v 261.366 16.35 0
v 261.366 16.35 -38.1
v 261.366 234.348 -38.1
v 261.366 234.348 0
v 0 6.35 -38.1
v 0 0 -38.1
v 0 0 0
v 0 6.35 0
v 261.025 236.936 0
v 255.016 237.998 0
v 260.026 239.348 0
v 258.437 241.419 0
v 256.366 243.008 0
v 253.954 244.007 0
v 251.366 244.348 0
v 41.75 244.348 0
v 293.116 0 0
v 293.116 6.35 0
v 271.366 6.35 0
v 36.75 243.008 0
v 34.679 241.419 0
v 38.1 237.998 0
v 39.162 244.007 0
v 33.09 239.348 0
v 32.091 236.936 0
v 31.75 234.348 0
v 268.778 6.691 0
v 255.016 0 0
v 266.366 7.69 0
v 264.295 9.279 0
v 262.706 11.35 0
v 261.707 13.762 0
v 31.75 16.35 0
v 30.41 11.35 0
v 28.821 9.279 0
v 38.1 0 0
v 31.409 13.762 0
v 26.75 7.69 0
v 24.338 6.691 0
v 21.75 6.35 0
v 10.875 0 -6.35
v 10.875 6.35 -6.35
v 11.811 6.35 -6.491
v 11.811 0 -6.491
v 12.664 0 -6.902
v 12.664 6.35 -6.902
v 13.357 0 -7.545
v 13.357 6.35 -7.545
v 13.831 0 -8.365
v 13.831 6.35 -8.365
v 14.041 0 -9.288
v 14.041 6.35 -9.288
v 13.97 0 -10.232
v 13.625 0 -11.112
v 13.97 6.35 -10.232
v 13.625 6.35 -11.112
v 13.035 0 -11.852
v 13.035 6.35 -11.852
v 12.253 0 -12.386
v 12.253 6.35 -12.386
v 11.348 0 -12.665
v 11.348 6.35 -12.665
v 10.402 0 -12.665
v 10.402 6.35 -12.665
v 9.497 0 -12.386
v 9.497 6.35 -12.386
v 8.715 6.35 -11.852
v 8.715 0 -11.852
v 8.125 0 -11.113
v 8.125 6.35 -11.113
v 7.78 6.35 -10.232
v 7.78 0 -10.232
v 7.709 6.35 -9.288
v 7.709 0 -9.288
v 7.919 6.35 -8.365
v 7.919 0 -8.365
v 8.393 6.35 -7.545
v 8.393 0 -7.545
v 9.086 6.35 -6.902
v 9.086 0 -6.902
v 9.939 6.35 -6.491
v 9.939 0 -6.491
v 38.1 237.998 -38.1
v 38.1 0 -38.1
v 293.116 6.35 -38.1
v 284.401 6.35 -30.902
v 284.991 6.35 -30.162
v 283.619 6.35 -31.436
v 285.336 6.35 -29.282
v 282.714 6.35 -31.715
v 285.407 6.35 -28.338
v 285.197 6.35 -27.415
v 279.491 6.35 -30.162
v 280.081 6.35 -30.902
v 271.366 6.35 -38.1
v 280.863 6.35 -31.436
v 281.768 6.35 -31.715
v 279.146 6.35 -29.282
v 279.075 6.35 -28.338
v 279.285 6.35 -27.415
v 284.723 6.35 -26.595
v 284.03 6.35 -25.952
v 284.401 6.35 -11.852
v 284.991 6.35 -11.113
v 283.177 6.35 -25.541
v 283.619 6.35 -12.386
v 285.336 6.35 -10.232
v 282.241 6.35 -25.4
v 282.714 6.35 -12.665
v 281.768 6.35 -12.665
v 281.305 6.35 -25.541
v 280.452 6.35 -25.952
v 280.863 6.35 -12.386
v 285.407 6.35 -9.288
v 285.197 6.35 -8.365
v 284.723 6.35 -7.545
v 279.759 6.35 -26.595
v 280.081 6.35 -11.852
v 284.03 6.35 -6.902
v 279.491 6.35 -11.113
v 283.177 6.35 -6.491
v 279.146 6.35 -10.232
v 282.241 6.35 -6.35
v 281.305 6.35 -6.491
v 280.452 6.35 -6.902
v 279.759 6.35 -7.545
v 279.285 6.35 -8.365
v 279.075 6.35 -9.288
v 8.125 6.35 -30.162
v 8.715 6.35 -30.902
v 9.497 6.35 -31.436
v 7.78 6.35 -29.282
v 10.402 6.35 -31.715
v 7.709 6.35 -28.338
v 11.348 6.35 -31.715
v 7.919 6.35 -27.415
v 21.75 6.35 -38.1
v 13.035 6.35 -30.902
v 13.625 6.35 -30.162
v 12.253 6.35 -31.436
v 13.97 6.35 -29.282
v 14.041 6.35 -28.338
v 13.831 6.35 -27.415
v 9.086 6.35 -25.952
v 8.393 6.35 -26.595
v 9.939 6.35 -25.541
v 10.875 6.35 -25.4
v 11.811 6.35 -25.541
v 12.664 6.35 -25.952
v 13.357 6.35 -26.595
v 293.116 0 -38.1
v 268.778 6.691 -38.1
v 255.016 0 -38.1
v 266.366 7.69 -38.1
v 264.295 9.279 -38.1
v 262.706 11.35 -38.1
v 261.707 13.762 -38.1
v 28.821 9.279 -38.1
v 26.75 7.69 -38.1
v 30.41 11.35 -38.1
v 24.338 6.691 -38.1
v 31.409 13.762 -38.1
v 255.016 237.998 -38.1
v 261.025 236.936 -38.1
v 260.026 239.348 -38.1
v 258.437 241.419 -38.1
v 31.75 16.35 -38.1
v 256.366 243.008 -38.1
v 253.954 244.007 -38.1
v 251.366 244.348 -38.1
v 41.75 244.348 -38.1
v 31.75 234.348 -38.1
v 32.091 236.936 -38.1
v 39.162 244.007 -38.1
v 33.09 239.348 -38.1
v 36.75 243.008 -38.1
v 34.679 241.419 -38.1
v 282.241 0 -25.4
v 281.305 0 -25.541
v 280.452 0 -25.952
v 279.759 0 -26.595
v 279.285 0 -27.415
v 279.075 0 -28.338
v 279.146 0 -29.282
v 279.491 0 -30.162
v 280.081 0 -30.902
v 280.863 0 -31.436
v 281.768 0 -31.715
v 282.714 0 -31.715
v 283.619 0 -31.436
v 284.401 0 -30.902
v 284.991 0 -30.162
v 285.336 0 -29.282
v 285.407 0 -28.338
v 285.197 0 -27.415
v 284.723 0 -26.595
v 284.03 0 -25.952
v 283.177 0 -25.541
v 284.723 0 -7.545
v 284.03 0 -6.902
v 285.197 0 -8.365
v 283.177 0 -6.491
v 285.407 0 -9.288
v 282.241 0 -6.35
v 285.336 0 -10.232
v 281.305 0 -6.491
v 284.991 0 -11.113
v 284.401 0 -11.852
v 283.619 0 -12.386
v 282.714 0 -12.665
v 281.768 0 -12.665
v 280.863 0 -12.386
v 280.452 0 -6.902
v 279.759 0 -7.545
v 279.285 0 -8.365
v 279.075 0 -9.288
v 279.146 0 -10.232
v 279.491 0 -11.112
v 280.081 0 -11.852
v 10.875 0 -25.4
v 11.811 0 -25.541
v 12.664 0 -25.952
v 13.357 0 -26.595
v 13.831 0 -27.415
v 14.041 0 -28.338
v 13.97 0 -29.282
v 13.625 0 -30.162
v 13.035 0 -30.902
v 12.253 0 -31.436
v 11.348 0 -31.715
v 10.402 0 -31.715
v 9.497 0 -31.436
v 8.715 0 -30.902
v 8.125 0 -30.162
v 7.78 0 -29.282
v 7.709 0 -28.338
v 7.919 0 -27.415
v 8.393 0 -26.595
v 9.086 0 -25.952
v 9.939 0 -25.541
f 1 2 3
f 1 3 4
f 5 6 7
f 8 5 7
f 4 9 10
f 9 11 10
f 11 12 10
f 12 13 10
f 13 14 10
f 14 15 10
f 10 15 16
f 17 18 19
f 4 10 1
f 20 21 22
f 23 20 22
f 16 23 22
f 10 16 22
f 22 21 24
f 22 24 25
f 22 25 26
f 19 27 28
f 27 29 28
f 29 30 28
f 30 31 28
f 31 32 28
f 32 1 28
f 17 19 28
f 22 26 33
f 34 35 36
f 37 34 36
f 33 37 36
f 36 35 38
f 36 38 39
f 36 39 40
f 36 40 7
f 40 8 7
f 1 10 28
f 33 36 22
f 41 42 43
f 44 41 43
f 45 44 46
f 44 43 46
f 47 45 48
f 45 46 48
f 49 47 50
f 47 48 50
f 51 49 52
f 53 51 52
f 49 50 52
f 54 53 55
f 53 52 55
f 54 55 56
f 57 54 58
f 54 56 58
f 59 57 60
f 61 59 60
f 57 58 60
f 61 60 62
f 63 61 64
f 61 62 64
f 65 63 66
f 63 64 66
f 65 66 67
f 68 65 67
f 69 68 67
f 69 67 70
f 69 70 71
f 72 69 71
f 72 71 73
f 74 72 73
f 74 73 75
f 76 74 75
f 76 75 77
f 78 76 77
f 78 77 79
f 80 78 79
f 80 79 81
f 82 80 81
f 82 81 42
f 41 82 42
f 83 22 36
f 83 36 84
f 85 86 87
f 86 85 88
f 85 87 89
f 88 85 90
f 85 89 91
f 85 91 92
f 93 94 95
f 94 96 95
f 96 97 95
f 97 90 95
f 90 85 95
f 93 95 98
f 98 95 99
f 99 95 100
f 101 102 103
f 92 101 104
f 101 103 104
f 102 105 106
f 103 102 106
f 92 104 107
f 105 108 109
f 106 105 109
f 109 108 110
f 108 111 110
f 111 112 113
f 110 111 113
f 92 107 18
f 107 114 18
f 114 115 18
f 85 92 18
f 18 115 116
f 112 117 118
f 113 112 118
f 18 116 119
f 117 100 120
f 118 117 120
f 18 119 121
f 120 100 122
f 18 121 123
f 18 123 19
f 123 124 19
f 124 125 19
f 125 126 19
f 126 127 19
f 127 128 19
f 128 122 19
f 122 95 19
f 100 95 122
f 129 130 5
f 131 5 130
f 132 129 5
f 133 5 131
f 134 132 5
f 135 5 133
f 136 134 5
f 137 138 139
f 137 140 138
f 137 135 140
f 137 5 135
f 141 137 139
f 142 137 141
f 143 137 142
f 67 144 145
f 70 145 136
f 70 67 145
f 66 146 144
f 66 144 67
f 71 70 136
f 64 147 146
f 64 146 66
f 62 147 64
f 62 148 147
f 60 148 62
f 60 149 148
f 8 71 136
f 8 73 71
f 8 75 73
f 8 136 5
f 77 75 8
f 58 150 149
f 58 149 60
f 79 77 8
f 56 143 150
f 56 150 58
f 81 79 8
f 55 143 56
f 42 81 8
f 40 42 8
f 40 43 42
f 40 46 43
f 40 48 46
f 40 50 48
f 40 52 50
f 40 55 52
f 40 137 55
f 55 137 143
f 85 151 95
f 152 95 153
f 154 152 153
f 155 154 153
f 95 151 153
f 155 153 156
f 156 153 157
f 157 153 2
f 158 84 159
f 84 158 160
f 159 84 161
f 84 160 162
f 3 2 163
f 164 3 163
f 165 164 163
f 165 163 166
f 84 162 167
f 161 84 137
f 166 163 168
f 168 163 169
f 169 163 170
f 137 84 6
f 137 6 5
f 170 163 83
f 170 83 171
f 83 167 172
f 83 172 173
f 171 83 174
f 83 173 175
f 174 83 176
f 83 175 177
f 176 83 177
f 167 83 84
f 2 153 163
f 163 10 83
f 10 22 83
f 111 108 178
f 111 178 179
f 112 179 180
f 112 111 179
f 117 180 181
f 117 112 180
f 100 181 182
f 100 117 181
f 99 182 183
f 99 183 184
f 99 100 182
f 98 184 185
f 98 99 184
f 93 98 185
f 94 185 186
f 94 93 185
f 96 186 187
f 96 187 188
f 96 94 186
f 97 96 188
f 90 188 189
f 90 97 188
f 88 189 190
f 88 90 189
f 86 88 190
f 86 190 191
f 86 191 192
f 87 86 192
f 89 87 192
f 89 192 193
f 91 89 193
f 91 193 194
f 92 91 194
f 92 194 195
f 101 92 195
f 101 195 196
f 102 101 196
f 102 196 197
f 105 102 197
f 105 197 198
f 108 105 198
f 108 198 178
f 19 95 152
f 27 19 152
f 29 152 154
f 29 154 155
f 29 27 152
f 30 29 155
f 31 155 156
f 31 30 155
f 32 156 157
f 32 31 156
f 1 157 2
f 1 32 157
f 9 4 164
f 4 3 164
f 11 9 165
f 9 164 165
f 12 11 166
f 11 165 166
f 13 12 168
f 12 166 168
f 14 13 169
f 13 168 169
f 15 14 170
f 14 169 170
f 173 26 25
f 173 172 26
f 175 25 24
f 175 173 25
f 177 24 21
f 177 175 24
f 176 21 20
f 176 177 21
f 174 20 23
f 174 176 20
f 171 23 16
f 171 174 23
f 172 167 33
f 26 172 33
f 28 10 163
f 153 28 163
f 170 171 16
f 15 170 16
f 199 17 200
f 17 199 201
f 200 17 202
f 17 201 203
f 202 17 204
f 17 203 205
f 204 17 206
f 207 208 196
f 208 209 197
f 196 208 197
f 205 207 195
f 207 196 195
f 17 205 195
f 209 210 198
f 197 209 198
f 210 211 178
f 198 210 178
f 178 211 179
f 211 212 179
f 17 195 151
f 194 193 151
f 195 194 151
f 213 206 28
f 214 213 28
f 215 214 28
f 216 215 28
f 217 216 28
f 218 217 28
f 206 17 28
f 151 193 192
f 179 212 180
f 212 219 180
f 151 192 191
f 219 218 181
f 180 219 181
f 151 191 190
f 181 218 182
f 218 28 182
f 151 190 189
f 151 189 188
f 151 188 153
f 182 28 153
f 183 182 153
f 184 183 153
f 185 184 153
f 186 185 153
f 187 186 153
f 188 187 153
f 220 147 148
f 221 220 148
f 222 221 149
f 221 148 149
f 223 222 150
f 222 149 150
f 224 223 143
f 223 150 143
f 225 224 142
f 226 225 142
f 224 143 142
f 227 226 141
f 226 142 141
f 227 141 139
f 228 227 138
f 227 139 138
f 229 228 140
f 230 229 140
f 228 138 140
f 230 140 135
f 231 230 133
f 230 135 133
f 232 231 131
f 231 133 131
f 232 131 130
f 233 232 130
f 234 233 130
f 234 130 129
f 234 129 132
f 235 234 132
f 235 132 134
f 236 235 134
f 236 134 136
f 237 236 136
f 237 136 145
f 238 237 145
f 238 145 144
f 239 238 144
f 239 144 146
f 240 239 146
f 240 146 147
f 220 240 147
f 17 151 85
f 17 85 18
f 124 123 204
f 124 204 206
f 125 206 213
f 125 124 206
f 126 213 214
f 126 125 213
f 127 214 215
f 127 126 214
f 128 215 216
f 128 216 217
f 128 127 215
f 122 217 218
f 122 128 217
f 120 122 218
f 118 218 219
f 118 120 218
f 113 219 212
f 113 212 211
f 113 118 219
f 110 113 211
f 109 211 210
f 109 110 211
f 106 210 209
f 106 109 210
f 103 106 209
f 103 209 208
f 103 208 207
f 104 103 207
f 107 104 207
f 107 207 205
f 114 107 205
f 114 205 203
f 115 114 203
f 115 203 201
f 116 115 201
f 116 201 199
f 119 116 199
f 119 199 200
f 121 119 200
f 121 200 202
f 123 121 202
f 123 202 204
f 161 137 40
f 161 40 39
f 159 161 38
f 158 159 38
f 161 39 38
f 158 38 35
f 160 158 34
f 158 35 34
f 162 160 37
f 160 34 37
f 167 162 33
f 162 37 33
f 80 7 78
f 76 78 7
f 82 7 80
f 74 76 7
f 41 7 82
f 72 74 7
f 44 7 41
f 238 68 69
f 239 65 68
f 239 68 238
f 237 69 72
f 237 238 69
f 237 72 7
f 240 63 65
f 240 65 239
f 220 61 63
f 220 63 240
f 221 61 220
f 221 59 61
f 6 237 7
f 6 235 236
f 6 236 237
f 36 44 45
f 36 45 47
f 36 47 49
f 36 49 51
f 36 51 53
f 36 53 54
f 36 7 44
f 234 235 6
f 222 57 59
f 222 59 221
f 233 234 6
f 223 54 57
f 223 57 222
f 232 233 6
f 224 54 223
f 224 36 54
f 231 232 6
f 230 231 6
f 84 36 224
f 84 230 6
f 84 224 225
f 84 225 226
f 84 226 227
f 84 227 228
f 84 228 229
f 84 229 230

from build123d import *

# Parameters (mm, degrees)
SKETCH2_W            = 38.1
SKETCH2_H            = 6.35
FILLET1_R            = 10
CUT_EXTRUDE1_REACH   = 284.088
SKETCH3_R            = 3.175
FILLET1_OF_MIRROR1_R = 10


with BuildPart() as part:
    # Sweep1: sweep along a path in Sketch1
    with BuildLine(Plane.XY) as sweep1_path:
        Line((0, 0), (38.1, 0))
        Line((38.1, 0), (38.1, 237.998))
        Line((38.1, 237.998), (146.558, 237.998))
    # Sketch2 → Sweep1 (sweep)
    with BuildSketch(Plane(origin=(0, 0, 0), x_dir=(0, 0, -1), z_dir=(1, 0, 0))):
        with Locations((19.05, 3.175)):
            Rectangle(SKETCH2_W, SKETCH2_H)
    sweep1 = sweep(path=sweep1_path.line, transition=Transition.RIGHT)

    # Fillet1
    fillet1_edges = [part.edges().sort_by_distance(p)[0] for p in [
        (31.75, 6.35, -19.05),
        (31.75, 244.348, -19.05),
    ]]
    fillet(fillet1_edges, radius=FILLET1_R)

    # Sketch3 → Cut-Extrude1 (cut, up to next)
    with BuildSketch(Plane(origin=(0, 6.35, 0), x_dir=(1, 0, 0), z_dir=(0, 1, 0)), mode=Mode.PRIVATE) as cut_extrude1_sk1:
        with Locations((10.875, 28.575)):
            Circle(SKETCH3_R)
    cut_extrude1_tool1 = extrude(cut_extrude1_sk1.sketch, amount=-CUT_EXTRUDE1_REACH, mode=Mode.PRIVATE) & part.part
    # Sketch3 → Cut-Extrude1 (cut, up to next)
    with BuildSketch(Plane(origin=(0, 6.35, 0), x_dir=(1, 0, 0), z_dir=(0, 1, 0)), mode=Mode.PRIVATE) as cut_extrude1_sk2:
        with Locations((10.875, 9.525)):
            Circle(SKETCH3_R)
    cut_extrude1_tool2 = extrude(cut_extrude1_sk2.sketch, amount=-CUT_EXTRUDE1_REACH, mode=Mode.PRIVATE) & part.part
    cut_extrude1_1 = cut_extrude1_tool1.solids().sort_by_distance((10.875, 6.35, -28.575))[0]
    add(cut_extrude1_1, mode=Mode.SUBTRACT)
    cut_extrude1_2 = cut_extrude1_tool2.solids().sort_by_distance((10.875, 6.35, -9.525))[0]
    add(cut_extrude1_2, mode=Mode.SUBTRACT)
    cut_extrude1 = cut_extrude1_1 + cut_extrude1_2  # Cut-Extrude1 as one shape, for the pattern or mirror that repeats it

    # Mirror1: Sweep1, Cut-Extrude1 across plane
    add(sweep1.mirror(Plane(origin=(146.558, 237.998, 0), x_dir=(0, 0, 1), z_dir=(-1, 0, 0))))
    add(cut_extrude1.mirror(Plane(origin=(146.558, 237.998, 0), x_dir=(0, 0, 1), z_dir=(-1, 0, 0))), mode=Mode.SUBTRACT)

    # Fillet1 of Mirror1
    fillet1_of_mirror1_edges = [part.edges().sort_by_distance(p)[0] for p in [
        (261.366, 6.35, -19.05),
        (261.366, 244.348, -19.05),
    ]]
    fillet(fillet1_of_mirror1_edges, radius=FILLET1_OF_MIRROR1_R)


solid = part.part
